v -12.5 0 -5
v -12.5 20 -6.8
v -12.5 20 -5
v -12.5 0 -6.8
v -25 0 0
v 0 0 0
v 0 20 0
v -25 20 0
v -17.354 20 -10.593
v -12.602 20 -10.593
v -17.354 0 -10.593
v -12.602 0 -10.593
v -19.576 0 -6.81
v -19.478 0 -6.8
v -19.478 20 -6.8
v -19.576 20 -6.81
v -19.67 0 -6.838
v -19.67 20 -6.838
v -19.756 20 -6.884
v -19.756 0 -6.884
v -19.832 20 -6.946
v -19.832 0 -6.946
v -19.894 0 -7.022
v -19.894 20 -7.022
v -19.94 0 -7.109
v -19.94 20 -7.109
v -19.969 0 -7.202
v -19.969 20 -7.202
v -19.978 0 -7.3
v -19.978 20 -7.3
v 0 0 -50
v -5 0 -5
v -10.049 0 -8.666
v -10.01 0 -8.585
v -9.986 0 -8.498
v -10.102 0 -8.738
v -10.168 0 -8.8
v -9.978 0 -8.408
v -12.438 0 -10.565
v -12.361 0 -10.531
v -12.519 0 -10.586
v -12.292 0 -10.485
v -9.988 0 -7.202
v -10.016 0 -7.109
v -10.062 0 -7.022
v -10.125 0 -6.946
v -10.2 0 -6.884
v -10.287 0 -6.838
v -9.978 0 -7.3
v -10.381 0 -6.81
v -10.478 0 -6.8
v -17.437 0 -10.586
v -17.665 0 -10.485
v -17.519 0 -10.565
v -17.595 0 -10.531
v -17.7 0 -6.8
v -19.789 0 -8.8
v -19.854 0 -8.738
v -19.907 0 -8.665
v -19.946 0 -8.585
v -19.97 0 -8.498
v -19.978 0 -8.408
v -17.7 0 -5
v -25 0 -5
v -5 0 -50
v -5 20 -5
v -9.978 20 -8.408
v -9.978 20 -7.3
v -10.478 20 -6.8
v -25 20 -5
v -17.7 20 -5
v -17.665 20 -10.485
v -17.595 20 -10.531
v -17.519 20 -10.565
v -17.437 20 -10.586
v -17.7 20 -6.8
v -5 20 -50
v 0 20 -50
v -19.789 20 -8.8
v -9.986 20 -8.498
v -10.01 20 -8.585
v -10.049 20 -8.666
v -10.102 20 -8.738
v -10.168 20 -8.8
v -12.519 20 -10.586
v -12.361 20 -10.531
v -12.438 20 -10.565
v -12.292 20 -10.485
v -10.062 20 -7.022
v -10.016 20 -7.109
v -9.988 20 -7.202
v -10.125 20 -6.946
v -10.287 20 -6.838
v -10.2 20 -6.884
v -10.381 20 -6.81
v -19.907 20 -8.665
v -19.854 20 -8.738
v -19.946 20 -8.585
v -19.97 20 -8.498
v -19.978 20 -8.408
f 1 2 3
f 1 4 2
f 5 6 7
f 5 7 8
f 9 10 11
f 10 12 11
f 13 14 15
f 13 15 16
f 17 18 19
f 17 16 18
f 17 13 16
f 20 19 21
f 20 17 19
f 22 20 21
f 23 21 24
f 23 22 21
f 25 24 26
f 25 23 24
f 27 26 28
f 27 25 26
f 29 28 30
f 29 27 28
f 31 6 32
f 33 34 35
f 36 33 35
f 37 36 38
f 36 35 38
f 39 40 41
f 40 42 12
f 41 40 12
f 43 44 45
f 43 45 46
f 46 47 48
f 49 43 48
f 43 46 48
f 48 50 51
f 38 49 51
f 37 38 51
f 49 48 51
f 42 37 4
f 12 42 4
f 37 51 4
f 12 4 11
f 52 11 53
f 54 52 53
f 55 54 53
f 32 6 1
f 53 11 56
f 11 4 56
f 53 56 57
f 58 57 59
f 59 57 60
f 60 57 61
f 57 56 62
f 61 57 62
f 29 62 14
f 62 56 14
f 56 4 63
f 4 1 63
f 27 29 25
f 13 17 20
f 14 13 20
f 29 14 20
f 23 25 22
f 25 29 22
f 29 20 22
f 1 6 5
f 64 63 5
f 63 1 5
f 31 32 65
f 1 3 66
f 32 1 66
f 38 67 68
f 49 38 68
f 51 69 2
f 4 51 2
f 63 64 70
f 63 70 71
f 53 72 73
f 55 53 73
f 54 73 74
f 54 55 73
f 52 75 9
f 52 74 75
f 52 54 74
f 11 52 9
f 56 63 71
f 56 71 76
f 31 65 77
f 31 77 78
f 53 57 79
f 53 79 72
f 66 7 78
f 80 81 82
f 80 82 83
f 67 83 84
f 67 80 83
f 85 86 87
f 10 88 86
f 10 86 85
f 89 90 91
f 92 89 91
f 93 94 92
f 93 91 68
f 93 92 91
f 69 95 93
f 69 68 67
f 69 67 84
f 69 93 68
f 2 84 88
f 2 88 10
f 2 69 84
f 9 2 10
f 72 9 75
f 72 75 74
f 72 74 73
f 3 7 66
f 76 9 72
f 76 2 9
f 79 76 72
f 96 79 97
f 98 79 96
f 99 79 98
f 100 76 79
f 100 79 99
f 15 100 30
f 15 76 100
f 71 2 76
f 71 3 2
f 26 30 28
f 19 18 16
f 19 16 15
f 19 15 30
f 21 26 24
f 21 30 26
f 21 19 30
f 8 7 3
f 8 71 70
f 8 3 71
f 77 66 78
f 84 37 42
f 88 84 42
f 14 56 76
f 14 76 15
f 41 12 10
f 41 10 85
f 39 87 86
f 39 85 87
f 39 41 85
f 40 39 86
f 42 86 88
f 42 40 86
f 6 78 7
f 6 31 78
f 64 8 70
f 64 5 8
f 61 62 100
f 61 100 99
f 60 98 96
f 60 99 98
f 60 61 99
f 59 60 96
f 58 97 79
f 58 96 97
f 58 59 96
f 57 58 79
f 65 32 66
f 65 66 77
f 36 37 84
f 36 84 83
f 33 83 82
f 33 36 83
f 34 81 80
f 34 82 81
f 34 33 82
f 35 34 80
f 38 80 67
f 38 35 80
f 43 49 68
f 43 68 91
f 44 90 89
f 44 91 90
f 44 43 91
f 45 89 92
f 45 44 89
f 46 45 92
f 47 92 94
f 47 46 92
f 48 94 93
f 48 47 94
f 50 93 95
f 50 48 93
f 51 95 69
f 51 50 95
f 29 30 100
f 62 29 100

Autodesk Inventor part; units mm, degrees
ref_plane "YZ Plane" through (0, 0, 0) normal (1, 0, 0) x (0, 1, 0)
ref_plane "XZ Plane" through (0, 0, 0) normal (0, 1, 0) x (-1, 0, 0)
ref_plane "XY Plane" through (0, 0, 0) normal (0, 0, 1) x (1, 0, 0)
sketch "Sketch1" plane through (0, 0, 0) normal (0, 1, 0) x (-1, 0, 0)
  line L0 (0, 0) -> (5, 0)
  line L1 (5, -5) -> (5, -50)
  line L2 (5, -50) -> (0, -50)
  line L3 (0, -50) -> (0, 0)
  line L4 (0, 0) -> (25, 0)
  line L5 (25, 0) -> (25, -5)
  line L6 (25, -5) -> (5, -5)
  line L7 (12.5, -5) -> (17.7, -5)
  line L8 (17.7, -5) -> (17.7, -6.8)
  line L9 (17.7, -6.8) -> (12.5, -6.8) construction
  line L10 (12.5, -6.8) -> (12.5, -5)
  line L11 (19.9782, -7.3) -> (19.9782, -8.4084)
  line L12 (19.9782, -8.65) -> (9.9782, -8.65) construction
  line L13 (9.9782, -8.4084) -> (9.9782, -7.3)
  line L14 (17.5282, -8.65) -> (12.4282, -8.65)
  line L15 (12.4282, -8.65) -> (12.4282, -10.5932) construction
  line L16 (12.6024, -10.5932) -> (17.354, -10.5932)
  line L17 (17.5282, -10.5932) -> (17.5282, -8.65) construction
  line L18 (10.1675, -8.8001) -> (12.2917, -10.4849)
  line L19 (19.7889, -8.8001) -> (17.6647, -10.4849)
  line L20 (0, 0) -> (21.2132, -21.2132) construction
  line L21 (0, 0) -> (30, 0) construction
  line L22 (17.6687, -6.6255) -> (12.5, -5) construction
  line L23 (17.7, -5) -> (12.2564, -6.5507) construction
  line L24 (19.9782, -6.8) -> (9.9782, -8.65) construction
  line L25 (19.9782, -8.65) -> (9.9782, -6.8) construction
  line L26 (14.9782, -5.7754) -> (14.9782, -19.5518) construction
  line L27 (17.5282, -8.65) -> (12.4282, -10.5932) construction
  line L28 (12.4282, -8.65) -> (17.5282, -10.5932) construction
  arc A0 (10.4782, -6.8) -> (9.9782, -7.3) centre (10.4782, -7.3) ccw
  arc A1 (9.9782, -8.4084) -> (10.1675, -8.8001) centre (10.4782, -8.4084) ccw
  arc A2 (12.2917, -10.4849) -> (12.6024, -10.5932) centre (12.6024, -10.0932) ccw
  arc A3 (17.354, -10.5932) -> (17.6647, -10.4849) centre (17.354, -10.0932) ccw
  arc A4 (19.7889, -8.8001) -> (19.9782, -8.4084) centre (19.4782, -8.4084) ccw
  arc A5 (19.9782, -7.3) -> (19.4782, -6.8) centre (19.4782, -7.3) ccw
  line L29 (10.4782, -6.8) -> (12.5001, -6.8)
  line L30 (12.5, -6.8) -> (17.7, -6.8) construction
  line L31 (17.7, -6.8) -> (19.4782, -6.8)
  point P0 (17.7, -5)
  point P1 (12.4282, -8.65)
  point P2 (25.5, -11.3)
  point P3 (14.9782, -7.725)
  point P4 (14.9782, -9.6216)
  point P5 (10.0405, -8.65)
  point P6 (19.916, -8.65)
  dimension "d0" = 5
  dimension "d1" = 50
  dimension "d3" = 5
  dimension "d6" = 10
  dimension "d10" = 5.1
  dimension "d11" = 1.9432
  dimension "d13" = 25
  dimension "d14" = 30
  dimension "d15" = 45
  dimension "d18" = 7.5
  dimension "d20" = 0.5
  dimension "d24" = 1.8
  dimension "d25" = 1.85
  dimension "d26" = 5.2
extrude "Extrusion1" add sketch "Sketch1" along normal blind 20
equation "\"d0\" = grosor"
equation "\"d3\" = grosor"
equation "\"d6\" = guia_ancho"
equation "\"d10\" = guia_ancho_menor"
equation "\"d11\" = guia_ancho_menor_espesor"
equation "\"d18\" = guia_sep_borde"
equation "\"d24\" = guia_sep_de_ext"
equation "\"d25\" = guia_ancho_espesor"
equation "\"d26\" = guia_cuello"
equation "\"grosor\" = 5"
equation "\"guia_tol\" = 0.5"
equation "\"guia_ancho\" = 10"
equation "\"guia_ancho_menor\" = 5.1"
equation "\"guia_ancho_menor_espesor\" = 1.943174"
equation "\"guia_sep_borde\" = 7.5"
equation "\"guia_sep_de_ext\" = 1.8"
equation "\"guia_ancho_espesor\" = 1.85"
equation "\"guia_cuello\" = 5.2"
properties part number "Guia_Perfil_test"
